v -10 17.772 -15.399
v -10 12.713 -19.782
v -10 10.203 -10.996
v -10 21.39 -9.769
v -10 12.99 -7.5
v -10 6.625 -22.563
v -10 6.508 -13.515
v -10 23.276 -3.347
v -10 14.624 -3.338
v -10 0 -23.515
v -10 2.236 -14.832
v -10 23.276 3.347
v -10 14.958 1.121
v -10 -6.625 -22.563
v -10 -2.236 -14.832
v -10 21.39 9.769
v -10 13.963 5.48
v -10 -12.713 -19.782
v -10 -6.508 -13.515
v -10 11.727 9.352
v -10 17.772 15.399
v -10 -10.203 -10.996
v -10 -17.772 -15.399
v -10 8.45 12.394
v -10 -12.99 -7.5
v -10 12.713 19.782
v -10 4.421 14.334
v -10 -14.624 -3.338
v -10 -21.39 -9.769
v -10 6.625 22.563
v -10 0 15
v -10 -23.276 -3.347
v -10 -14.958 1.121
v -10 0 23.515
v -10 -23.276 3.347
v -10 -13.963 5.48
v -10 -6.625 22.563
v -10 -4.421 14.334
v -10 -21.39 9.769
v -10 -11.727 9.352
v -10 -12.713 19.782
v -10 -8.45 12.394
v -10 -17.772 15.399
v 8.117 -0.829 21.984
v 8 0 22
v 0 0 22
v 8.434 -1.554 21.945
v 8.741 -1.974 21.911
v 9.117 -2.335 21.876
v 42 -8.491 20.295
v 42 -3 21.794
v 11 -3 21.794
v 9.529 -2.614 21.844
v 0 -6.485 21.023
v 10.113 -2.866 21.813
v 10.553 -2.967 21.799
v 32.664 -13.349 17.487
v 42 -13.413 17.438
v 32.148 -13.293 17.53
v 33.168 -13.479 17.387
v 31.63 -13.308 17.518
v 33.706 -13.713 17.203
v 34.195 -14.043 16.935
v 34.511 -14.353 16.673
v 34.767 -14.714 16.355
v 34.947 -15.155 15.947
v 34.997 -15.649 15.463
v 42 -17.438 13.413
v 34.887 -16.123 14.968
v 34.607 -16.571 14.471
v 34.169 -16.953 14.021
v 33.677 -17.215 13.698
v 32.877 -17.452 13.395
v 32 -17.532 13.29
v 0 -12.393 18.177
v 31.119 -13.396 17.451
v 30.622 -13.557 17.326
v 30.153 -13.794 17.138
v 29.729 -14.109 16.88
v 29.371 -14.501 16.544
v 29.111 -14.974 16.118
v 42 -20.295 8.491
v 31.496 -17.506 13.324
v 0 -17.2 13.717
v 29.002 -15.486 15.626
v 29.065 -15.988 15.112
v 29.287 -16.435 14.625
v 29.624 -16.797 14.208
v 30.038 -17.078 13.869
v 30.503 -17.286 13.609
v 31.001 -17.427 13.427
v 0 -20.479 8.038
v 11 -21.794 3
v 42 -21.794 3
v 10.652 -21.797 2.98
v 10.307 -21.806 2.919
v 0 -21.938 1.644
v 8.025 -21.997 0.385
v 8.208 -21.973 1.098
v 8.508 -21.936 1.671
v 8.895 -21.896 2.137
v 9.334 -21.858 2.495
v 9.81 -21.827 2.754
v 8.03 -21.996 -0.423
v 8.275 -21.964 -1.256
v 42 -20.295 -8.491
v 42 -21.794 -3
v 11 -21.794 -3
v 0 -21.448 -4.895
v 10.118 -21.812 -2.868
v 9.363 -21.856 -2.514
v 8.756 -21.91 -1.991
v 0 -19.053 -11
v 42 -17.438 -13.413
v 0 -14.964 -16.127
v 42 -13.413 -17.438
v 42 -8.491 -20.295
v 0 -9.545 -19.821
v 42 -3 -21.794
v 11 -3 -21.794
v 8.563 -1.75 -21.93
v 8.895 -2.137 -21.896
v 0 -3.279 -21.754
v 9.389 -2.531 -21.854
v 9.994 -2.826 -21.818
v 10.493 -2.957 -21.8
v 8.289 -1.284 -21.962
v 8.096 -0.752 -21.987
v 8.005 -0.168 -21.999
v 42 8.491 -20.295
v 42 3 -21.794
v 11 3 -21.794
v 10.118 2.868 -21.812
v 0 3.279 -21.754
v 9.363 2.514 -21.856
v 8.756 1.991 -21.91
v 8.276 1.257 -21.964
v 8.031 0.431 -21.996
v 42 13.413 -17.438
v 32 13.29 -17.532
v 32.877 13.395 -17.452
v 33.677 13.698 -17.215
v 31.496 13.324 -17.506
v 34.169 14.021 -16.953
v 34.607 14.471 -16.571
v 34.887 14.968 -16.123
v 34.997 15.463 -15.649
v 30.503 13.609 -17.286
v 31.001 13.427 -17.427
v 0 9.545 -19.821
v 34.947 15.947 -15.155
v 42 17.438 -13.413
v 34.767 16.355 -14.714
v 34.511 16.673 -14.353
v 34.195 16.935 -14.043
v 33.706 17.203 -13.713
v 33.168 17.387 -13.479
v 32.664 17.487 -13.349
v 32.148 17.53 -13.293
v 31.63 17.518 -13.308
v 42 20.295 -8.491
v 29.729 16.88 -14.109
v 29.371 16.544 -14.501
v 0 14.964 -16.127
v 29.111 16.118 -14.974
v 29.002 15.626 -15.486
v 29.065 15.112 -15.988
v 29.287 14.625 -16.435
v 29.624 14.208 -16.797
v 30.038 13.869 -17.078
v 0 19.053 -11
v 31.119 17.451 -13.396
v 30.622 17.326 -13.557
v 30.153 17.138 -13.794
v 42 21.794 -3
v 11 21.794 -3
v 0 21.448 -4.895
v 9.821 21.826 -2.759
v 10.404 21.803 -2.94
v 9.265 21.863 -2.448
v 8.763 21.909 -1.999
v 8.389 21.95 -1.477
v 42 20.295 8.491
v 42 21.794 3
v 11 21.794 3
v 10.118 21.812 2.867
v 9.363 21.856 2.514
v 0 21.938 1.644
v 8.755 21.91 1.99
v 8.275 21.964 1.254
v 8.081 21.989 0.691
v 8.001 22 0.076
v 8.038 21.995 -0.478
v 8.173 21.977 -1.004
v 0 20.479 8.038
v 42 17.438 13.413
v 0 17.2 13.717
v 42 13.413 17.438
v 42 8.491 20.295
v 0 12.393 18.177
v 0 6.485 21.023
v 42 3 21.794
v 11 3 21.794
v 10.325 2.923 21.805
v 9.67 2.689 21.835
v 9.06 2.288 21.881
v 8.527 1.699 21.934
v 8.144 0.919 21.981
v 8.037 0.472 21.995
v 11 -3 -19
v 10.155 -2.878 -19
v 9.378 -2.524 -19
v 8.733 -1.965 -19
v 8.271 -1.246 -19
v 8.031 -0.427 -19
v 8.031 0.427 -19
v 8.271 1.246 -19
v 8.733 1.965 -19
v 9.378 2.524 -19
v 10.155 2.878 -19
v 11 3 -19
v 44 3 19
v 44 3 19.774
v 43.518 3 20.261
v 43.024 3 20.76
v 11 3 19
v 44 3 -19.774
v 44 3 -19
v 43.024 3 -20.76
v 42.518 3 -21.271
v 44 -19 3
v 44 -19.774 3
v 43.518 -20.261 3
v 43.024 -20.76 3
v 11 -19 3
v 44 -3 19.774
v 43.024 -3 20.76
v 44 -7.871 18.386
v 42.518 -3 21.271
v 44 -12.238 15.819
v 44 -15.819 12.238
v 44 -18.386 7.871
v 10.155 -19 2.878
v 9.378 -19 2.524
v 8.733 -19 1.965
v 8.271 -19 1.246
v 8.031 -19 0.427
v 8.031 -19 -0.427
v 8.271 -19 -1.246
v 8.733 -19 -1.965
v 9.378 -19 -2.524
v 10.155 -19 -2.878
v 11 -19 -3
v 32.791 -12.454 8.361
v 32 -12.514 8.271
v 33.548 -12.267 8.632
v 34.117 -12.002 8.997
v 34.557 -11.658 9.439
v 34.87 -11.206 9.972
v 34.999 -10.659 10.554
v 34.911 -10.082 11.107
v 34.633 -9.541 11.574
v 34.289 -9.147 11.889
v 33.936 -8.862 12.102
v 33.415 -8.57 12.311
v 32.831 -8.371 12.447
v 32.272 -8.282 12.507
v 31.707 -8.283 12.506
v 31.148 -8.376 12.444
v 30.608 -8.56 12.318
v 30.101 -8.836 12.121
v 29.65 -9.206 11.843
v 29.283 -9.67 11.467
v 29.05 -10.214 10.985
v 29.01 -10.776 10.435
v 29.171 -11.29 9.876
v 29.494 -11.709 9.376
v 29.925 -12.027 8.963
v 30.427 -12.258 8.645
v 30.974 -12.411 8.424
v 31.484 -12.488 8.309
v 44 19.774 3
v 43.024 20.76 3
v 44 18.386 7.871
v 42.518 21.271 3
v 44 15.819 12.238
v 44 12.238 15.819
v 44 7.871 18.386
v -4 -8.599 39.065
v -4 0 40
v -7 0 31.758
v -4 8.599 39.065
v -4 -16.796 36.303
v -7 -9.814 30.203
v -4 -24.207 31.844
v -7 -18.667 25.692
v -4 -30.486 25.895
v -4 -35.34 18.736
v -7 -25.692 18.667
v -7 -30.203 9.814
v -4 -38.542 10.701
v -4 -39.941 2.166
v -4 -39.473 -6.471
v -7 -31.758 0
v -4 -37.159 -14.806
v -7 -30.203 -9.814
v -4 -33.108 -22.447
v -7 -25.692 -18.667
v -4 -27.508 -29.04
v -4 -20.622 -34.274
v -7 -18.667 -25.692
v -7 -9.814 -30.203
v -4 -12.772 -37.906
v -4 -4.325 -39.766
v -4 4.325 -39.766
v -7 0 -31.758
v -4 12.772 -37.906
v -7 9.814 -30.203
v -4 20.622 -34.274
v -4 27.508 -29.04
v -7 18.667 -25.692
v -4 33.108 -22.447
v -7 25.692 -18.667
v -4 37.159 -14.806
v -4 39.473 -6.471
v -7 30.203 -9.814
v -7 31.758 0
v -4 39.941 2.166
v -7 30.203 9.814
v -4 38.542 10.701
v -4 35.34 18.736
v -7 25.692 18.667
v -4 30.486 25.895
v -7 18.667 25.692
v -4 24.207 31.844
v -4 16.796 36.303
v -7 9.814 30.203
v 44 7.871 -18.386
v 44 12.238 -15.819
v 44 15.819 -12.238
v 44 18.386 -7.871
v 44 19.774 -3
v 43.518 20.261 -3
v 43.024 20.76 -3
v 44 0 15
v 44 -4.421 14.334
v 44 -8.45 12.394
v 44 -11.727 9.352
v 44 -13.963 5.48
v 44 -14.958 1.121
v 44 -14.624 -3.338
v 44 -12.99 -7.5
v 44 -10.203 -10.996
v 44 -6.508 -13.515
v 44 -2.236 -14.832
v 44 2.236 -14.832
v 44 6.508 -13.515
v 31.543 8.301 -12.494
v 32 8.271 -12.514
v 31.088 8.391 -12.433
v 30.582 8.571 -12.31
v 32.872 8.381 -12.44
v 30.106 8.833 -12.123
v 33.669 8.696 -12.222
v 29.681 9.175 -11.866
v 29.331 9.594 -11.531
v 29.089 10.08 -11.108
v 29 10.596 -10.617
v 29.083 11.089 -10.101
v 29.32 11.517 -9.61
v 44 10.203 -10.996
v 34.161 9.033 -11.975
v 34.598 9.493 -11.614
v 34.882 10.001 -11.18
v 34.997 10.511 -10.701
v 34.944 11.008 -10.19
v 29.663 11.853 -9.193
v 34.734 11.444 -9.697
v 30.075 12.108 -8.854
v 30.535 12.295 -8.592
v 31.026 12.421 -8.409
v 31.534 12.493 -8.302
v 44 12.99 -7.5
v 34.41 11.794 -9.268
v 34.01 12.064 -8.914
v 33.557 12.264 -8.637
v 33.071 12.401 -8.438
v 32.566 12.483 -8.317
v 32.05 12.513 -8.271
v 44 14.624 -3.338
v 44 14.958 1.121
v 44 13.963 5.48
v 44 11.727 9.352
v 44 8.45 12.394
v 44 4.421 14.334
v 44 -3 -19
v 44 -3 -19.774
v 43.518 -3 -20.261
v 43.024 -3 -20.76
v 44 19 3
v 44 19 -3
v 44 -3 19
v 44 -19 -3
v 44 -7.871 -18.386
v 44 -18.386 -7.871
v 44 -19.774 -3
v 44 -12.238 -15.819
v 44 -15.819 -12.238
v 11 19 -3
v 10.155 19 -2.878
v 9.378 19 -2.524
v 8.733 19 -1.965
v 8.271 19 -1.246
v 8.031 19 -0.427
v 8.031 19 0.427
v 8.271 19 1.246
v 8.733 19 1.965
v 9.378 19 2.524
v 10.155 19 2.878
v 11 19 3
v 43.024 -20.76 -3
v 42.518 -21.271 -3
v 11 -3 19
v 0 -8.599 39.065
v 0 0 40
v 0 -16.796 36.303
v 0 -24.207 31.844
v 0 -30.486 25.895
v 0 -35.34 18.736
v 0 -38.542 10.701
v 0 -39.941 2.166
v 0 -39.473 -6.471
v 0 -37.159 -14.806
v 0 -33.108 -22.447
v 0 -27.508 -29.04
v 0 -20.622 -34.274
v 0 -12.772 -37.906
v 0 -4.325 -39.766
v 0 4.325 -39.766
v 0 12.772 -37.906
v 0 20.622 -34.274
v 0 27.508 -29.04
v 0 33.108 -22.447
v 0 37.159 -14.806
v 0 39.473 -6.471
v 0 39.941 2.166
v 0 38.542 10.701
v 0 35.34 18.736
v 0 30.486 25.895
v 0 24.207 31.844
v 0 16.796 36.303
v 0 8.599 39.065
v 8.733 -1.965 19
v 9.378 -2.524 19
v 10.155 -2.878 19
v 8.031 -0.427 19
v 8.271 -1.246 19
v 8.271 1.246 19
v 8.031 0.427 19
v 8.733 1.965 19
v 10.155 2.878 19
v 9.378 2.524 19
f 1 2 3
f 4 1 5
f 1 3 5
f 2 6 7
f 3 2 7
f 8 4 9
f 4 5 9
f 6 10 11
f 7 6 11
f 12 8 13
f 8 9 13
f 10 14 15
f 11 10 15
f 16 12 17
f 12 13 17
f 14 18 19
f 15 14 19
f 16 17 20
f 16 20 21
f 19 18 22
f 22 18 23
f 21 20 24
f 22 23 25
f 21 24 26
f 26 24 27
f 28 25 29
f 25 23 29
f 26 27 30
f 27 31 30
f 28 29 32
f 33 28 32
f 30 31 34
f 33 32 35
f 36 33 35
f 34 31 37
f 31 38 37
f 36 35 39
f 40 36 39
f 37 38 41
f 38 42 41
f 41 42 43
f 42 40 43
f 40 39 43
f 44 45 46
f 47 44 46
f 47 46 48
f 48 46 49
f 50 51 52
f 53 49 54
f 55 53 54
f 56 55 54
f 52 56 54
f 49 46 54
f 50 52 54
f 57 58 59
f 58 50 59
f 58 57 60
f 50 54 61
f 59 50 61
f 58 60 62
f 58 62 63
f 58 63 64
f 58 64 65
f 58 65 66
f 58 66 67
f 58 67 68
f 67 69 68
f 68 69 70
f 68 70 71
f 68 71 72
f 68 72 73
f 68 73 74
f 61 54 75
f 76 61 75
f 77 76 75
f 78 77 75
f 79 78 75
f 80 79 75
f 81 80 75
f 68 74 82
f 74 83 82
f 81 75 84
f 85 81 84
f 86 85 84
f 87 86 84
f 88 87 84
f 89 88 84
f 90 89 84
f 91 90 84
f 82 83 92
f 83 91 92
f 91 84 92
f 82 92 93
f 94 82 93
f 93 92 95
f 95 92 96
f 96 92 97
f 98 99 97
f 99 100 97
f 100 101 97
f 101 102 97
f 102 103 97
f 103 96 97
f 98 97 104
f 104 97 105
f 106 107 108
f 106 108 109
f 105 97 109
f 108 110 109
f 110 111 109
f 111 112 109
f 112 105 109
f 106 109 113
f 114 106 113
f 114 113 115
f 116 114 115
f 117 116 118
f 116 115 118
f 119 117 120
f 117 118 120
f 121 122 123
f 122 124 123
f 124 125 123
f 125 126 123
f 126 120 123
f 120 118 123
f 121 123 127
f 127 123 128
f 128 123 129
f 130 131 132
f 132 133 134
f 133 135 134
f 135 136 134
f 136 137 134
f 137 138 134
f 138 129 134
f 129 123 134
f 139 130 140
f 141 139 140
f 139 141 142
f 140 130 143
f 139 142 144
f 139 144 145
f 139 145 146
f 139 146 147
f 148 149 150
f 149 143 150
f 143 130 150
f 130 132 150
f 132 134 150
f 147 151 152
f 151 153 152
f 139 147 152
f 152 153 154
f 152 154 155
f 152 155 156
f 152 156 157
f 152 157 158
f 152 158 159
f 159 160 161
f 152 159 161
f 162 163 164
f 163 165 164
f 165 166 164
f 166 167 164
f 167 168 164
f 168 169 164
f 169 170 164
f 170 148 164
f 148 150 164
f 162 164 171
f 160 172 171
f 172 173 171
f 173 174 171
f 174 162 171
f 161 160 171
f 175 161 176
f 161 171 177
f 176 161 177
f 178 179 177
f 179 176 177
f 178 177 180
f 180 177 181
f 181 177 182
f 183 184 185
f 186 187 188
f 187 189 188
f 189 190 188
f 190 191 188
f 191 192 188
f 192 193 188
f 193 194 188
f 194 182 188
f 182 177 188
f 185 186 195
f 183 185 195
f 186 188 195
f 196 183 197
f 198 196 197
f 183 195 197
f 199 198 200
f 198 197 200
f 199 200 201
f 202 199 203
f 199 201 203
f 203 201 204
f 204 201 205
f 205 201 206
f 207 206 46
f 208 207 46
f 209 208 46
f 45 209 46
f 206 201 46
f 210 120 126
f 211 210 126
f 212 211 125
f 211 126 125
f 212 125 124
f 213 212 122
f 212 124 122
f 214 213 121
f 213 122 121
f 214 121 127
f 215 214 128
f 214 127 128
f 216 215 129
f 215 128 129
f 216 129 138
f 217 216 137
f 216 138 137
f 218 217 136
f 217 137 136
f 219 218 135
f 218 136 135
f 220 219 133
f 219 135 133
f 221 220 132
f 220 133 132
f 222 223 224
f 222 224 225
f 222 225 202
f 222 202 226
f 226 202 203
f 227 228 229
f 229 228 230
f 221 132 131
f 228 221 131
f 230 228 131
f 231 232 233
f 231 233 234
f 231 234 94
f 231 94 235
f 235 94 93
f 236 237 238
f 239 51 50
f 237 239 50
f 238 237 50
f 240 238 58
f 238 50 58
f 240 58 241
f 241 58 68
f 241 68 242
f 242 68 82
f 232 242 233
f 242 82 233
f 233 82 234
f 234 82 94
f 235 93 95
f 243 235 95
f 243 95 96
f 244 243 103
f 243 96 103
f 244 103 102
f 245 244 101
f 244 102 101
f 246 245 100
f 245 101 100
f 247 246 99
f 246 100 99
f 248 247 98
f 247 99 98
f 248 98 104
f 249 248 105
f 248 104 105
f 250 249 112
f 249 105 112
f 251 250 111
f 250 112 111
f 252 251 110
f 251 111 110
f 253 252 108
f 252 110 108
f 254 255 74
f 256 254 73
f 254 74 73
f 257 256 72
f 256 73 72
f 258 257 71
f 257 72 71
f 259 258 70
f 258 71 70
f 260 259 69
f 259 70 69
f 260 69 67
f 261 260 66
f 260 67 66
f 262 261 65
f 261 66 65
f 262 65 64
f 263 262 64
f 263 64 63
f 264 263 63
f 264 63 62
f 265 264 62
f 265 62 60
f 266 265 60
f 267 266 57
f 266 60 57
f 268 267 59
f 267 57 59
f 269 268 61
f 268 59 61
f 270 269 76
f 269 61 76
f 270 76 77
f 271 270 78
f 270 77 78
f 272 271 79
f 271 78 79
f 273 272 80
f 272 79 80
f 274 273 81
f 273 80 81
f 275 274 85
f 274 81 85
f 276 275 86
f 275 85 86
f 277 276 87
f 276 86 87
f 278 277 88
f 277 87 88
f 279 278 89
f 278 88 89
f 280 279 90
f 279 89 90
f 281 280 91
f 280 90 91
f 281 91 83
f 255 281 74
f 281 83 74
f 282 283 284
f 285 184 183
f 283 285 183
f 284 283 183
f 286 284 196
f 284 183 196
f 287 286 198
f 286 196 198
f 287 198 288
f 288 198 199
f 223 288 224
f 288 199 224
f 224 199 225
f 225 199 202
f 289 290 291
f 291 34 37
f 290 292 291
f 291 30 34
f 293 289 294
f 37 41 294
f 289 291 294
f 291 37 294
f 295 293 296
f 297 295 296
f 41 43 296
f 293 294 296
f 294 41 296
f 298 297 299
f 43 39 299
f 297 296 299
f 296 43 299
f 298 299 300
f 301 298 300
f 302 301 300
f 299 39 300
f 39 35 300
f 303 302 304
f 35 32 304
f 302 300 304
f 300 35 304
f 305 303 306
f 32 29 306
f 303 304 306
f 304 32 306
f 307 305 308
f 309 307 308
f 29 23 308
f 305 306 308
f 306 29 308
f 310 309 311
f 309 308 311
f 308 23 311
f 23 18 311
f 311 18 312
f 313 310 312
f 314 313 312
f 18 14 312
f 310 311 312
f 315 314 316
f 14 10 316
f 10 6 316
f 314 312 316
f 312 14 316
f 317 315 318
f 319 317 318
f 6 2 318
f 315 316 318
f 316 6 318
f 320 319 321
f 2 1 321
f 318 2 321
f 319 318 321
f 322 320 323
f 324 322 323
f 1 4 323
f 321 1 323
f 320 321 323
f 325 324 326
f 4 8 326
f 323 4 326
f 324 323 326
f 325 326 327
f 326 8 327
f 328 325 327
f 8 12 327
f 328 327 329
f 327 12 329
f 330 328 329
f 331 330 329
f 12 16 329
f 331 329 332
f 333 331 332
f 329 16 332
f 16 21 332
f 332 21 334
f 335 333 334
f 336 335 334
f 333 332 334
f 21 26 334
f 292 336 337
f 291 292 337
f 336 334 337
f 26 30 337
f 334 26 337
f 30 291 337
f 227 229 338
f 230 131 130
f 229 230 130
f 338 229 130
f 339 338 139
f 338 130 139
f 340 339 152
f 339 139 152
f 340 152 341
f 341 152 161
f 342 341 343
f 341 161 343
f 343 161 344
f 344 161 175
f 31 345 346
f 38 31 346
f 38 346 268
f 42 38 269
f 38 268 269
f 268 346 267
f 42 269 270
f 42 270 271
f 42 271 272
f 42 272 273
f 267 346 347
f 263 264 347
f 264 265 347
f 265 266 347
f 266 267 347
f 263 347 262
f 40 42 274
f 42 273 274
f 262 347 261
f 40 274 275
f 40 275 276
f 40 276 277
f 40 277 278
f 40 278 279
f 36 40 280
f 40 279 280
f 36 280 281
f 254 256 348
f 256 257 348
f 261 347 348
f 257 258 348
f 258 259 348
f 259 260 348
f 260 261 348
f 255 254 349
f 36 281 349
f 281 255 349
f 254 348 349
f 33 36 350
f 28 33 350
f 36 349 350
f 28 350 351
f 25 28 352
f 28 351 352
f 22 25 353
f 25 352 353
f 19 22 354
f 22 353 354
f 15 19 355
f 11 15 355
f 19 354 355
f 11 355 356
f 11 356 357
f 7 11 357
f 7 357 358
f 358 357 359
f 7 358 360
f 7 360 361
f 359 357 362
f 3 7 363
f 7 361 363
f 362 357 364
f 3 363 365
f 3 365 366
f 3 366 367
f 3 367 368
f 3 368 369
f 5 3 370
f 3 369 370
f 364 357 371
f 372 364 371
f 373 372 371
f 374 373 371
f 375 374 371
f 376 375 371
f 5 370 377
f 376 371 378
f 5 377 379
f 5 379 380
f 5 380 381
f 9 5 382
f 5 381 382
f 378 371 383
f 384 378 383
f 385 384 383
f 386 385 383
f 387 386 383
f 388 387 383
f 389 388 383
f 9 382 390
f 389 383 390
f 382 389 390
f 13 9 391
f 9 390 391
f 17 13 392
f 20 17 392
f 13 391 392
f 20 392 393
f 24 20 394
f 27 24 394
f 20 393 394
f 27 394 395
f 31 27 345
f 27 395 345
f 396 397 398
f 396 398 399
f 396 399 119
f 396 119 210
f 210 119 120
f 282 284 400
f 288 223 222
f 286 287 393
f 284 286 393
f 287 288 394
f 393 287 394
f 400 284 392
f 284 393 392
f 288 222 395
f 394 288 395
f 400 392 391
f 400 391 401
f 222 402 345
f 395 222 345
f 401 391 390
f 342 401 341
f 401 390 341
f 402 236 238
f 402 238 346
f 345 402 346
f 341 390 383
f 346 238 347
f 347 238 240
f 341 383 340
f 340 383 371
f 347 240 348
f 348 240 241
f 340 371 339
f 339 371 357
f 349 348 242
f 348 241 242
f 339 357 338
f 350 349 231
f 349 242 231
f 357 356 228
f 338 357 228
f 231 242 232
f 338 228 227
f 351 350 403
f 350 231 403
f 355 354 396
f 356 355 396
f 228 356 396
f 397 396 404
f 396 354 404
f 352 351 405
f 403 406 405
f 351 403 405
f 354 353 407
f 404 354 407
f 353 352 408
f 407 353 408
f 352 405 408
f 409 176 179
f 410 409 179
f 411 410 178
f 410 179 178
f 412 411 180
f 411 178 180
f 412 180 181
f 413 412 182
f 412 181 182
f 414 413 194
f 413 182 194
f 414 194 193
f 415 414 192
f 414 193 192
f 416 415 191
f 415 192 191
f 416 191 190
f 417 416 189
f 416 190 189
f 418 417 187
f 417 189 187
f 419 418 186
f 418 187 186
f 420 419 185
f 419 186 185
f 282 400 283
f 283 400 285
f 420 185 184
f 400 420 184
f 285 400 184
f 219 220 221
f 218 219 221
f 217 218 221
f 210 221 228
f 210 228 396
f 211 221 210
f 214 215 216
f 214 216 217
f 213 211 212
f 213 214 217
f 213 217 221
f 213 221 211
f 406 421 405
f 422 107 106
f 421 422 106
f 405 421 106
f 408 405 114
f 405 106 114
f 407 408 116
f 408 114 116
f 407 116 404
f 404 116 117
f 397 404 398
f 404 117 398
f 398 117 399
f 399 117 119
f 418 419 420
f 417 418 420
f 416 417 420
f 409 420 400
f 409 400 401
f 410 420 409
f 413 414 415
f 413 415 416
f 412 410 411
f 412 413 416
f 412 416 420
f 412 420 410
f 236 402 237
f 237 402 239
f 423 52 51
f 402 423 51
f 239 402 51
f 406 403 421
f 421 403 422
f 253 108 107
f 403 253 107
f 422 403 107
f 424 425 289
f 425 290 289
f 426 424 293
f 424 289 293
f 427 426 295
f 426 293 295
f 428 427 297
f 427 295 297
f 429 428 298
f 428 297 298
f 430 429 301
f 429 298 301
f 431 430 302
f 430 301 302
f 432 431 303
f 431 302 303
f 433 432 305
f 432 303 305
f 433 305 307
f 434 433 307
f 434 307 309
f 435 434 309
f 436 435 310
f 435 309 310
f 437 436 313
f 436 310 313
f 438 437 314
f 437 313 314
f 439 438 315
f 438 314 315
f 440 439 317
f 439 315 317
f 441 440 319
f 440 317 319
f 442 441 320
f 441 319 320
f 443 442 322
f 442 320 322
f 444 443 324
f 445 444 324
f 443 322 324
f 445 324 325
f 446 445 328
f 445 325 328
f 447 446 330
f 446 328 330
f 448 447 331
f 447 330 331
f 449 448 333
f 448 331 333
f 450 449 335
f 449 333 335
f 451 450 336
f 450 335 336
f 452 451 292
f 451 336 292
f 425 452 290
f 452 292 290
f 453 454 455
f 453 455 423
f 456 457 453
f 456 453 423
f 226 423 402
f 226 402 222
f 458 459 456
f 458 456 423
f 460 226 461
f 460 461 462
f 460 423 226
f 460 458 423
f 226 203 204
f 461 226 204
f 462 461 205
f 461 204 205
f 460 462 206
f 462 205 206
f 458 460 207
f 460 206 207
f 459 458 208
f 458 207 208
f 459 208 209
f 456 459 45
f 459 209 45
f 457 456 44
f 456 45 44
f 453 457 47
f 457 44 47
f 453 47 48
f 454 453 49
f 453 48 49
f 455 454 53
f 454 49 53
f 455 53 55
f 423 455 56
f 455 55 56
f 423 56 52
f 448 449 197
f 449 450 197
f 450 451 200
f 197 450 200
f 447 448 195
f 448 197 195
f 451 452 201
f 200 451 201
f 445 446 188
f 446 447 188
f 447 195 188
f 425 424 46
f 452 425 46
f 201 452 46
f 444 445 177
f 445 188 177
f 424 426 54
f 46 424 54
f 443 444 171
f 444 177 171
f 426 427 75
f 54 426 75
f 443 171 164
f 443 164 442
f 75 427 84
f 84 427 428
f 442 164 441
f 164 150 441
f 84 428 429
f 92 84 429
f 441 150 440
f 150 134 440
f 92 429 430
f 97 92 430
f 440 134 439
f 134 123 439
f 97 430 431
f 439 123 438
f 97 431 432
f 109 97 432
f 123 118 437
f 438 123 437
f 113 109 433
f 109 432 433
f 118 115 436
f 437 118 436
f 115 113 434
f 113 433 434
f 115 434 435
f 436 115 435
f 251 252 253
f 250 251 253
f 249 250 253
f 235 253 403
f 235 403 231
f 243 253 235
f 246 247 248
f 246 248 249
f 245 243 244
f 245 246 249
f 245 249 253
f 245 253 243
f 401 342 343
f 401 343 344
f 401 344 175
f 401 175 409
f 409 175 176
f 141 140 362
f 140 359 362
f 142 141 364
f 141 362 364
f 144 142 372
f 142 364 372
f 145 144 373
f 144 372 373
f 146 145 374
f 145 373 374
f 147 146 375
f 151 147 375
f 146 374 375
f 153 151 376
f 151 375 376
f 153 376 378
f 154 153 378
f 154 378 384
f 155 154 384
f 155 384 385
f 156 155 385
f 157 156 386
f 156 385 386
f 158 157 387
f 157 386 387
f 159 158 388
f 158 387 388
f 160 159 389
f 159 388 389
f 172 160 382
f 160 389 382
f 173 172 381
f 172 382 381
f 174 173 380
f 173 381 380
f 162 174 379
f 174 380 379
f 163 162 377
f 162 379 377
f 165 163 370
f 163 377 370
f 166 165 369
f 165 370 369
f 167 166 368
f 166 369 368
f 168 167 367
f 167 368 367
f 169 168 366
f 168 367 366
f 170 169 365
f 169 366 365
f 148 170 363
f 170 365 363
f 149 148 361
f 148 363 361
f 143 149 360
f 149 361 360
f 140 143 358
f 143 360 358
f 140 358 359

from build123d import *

# Parameters (mm, degrees)
ENL_V_MAT_EXTRU_1_DEPTH      = 3
R_P_TITION_CIRCULAIRE1_COUNT = 4
ESQUISSE5_R                  = 3
ENL_V_MAT_EXTRU_2_DEPTH      = 40


with BuildPart() as part:
    # Esquisse1 → Base-Révolution (revolve)
    with BuildSketch(Plane.XY, mode=Mode.PRIVATE) as base_r_volution_sk:
        Polygon((0, 40), (-4, 40), (-10, 23.515135483), (-10, 15), (44, 15), (44, 20), (42, 22), (0, 22), align=None)
    revolve(base_r_volution_sk.sketch.rotate(Axis((0, 0, 0), (1, 0, 0)), 90), axis=Axis((0, 0, 0), (1, 0, 0)))

    # Esquisse3 → Enlèv. mat.-Extru.1 (cut)
    with BuildSketch(Plane(origin=(21, 22, 0), x_dir=(0, 0, -1), z_dir=(0, 1, 0))):
        with BuildLine():
            Line((-3, -25), (3, -25))
            Line((3, -25), (3, 10))
            ThreePointArc((3, 10), (0, 13), (-3, 10))
            Line((-3, 10), (-3, -25))
        make_face()
    enl_v_mat_extru_1 = extrude(amount=-ENL_V_MAT_EXTRU_1_DEPTH, mode=Mode.SUBTRACT)

    # Répétition circulaire1: Enlèv. mat.-Extru.1 ×4 about axis
    r_p_tition_circulaire1_axis = Axis((0, 0, 0), (1, 0, 0))
    for i in range(1, R_P_TITION_CIRCULAIRE1_COUNT):
        add(enl_v_mat_extru_1.rotate(r_p_tition_circulaire1_axis, i * 360 / R_P_TITION_CIRCULAIRE1_COUNT), mode=Mode.SUBTRACT)

    # Esquisse5 → Enlèv. mat.-Extru.2 (cut, symmetric)
    with BuildSketch(Plane(origin=(0, 0, 0), x_dir=(1, 0, 0), z_dir=(0, -0.7071067811865488, 0.7071067811865462))):
        with Locations(Location((32, 0, 0), (0, 0, 270))):
            Circle(ESQUISSE5_R)
    extrude(amount=ENL_V_MAT_EXTRU_2_DEPTH, both=True, mode=Mode.SUBTRACT)


solid = part.part
